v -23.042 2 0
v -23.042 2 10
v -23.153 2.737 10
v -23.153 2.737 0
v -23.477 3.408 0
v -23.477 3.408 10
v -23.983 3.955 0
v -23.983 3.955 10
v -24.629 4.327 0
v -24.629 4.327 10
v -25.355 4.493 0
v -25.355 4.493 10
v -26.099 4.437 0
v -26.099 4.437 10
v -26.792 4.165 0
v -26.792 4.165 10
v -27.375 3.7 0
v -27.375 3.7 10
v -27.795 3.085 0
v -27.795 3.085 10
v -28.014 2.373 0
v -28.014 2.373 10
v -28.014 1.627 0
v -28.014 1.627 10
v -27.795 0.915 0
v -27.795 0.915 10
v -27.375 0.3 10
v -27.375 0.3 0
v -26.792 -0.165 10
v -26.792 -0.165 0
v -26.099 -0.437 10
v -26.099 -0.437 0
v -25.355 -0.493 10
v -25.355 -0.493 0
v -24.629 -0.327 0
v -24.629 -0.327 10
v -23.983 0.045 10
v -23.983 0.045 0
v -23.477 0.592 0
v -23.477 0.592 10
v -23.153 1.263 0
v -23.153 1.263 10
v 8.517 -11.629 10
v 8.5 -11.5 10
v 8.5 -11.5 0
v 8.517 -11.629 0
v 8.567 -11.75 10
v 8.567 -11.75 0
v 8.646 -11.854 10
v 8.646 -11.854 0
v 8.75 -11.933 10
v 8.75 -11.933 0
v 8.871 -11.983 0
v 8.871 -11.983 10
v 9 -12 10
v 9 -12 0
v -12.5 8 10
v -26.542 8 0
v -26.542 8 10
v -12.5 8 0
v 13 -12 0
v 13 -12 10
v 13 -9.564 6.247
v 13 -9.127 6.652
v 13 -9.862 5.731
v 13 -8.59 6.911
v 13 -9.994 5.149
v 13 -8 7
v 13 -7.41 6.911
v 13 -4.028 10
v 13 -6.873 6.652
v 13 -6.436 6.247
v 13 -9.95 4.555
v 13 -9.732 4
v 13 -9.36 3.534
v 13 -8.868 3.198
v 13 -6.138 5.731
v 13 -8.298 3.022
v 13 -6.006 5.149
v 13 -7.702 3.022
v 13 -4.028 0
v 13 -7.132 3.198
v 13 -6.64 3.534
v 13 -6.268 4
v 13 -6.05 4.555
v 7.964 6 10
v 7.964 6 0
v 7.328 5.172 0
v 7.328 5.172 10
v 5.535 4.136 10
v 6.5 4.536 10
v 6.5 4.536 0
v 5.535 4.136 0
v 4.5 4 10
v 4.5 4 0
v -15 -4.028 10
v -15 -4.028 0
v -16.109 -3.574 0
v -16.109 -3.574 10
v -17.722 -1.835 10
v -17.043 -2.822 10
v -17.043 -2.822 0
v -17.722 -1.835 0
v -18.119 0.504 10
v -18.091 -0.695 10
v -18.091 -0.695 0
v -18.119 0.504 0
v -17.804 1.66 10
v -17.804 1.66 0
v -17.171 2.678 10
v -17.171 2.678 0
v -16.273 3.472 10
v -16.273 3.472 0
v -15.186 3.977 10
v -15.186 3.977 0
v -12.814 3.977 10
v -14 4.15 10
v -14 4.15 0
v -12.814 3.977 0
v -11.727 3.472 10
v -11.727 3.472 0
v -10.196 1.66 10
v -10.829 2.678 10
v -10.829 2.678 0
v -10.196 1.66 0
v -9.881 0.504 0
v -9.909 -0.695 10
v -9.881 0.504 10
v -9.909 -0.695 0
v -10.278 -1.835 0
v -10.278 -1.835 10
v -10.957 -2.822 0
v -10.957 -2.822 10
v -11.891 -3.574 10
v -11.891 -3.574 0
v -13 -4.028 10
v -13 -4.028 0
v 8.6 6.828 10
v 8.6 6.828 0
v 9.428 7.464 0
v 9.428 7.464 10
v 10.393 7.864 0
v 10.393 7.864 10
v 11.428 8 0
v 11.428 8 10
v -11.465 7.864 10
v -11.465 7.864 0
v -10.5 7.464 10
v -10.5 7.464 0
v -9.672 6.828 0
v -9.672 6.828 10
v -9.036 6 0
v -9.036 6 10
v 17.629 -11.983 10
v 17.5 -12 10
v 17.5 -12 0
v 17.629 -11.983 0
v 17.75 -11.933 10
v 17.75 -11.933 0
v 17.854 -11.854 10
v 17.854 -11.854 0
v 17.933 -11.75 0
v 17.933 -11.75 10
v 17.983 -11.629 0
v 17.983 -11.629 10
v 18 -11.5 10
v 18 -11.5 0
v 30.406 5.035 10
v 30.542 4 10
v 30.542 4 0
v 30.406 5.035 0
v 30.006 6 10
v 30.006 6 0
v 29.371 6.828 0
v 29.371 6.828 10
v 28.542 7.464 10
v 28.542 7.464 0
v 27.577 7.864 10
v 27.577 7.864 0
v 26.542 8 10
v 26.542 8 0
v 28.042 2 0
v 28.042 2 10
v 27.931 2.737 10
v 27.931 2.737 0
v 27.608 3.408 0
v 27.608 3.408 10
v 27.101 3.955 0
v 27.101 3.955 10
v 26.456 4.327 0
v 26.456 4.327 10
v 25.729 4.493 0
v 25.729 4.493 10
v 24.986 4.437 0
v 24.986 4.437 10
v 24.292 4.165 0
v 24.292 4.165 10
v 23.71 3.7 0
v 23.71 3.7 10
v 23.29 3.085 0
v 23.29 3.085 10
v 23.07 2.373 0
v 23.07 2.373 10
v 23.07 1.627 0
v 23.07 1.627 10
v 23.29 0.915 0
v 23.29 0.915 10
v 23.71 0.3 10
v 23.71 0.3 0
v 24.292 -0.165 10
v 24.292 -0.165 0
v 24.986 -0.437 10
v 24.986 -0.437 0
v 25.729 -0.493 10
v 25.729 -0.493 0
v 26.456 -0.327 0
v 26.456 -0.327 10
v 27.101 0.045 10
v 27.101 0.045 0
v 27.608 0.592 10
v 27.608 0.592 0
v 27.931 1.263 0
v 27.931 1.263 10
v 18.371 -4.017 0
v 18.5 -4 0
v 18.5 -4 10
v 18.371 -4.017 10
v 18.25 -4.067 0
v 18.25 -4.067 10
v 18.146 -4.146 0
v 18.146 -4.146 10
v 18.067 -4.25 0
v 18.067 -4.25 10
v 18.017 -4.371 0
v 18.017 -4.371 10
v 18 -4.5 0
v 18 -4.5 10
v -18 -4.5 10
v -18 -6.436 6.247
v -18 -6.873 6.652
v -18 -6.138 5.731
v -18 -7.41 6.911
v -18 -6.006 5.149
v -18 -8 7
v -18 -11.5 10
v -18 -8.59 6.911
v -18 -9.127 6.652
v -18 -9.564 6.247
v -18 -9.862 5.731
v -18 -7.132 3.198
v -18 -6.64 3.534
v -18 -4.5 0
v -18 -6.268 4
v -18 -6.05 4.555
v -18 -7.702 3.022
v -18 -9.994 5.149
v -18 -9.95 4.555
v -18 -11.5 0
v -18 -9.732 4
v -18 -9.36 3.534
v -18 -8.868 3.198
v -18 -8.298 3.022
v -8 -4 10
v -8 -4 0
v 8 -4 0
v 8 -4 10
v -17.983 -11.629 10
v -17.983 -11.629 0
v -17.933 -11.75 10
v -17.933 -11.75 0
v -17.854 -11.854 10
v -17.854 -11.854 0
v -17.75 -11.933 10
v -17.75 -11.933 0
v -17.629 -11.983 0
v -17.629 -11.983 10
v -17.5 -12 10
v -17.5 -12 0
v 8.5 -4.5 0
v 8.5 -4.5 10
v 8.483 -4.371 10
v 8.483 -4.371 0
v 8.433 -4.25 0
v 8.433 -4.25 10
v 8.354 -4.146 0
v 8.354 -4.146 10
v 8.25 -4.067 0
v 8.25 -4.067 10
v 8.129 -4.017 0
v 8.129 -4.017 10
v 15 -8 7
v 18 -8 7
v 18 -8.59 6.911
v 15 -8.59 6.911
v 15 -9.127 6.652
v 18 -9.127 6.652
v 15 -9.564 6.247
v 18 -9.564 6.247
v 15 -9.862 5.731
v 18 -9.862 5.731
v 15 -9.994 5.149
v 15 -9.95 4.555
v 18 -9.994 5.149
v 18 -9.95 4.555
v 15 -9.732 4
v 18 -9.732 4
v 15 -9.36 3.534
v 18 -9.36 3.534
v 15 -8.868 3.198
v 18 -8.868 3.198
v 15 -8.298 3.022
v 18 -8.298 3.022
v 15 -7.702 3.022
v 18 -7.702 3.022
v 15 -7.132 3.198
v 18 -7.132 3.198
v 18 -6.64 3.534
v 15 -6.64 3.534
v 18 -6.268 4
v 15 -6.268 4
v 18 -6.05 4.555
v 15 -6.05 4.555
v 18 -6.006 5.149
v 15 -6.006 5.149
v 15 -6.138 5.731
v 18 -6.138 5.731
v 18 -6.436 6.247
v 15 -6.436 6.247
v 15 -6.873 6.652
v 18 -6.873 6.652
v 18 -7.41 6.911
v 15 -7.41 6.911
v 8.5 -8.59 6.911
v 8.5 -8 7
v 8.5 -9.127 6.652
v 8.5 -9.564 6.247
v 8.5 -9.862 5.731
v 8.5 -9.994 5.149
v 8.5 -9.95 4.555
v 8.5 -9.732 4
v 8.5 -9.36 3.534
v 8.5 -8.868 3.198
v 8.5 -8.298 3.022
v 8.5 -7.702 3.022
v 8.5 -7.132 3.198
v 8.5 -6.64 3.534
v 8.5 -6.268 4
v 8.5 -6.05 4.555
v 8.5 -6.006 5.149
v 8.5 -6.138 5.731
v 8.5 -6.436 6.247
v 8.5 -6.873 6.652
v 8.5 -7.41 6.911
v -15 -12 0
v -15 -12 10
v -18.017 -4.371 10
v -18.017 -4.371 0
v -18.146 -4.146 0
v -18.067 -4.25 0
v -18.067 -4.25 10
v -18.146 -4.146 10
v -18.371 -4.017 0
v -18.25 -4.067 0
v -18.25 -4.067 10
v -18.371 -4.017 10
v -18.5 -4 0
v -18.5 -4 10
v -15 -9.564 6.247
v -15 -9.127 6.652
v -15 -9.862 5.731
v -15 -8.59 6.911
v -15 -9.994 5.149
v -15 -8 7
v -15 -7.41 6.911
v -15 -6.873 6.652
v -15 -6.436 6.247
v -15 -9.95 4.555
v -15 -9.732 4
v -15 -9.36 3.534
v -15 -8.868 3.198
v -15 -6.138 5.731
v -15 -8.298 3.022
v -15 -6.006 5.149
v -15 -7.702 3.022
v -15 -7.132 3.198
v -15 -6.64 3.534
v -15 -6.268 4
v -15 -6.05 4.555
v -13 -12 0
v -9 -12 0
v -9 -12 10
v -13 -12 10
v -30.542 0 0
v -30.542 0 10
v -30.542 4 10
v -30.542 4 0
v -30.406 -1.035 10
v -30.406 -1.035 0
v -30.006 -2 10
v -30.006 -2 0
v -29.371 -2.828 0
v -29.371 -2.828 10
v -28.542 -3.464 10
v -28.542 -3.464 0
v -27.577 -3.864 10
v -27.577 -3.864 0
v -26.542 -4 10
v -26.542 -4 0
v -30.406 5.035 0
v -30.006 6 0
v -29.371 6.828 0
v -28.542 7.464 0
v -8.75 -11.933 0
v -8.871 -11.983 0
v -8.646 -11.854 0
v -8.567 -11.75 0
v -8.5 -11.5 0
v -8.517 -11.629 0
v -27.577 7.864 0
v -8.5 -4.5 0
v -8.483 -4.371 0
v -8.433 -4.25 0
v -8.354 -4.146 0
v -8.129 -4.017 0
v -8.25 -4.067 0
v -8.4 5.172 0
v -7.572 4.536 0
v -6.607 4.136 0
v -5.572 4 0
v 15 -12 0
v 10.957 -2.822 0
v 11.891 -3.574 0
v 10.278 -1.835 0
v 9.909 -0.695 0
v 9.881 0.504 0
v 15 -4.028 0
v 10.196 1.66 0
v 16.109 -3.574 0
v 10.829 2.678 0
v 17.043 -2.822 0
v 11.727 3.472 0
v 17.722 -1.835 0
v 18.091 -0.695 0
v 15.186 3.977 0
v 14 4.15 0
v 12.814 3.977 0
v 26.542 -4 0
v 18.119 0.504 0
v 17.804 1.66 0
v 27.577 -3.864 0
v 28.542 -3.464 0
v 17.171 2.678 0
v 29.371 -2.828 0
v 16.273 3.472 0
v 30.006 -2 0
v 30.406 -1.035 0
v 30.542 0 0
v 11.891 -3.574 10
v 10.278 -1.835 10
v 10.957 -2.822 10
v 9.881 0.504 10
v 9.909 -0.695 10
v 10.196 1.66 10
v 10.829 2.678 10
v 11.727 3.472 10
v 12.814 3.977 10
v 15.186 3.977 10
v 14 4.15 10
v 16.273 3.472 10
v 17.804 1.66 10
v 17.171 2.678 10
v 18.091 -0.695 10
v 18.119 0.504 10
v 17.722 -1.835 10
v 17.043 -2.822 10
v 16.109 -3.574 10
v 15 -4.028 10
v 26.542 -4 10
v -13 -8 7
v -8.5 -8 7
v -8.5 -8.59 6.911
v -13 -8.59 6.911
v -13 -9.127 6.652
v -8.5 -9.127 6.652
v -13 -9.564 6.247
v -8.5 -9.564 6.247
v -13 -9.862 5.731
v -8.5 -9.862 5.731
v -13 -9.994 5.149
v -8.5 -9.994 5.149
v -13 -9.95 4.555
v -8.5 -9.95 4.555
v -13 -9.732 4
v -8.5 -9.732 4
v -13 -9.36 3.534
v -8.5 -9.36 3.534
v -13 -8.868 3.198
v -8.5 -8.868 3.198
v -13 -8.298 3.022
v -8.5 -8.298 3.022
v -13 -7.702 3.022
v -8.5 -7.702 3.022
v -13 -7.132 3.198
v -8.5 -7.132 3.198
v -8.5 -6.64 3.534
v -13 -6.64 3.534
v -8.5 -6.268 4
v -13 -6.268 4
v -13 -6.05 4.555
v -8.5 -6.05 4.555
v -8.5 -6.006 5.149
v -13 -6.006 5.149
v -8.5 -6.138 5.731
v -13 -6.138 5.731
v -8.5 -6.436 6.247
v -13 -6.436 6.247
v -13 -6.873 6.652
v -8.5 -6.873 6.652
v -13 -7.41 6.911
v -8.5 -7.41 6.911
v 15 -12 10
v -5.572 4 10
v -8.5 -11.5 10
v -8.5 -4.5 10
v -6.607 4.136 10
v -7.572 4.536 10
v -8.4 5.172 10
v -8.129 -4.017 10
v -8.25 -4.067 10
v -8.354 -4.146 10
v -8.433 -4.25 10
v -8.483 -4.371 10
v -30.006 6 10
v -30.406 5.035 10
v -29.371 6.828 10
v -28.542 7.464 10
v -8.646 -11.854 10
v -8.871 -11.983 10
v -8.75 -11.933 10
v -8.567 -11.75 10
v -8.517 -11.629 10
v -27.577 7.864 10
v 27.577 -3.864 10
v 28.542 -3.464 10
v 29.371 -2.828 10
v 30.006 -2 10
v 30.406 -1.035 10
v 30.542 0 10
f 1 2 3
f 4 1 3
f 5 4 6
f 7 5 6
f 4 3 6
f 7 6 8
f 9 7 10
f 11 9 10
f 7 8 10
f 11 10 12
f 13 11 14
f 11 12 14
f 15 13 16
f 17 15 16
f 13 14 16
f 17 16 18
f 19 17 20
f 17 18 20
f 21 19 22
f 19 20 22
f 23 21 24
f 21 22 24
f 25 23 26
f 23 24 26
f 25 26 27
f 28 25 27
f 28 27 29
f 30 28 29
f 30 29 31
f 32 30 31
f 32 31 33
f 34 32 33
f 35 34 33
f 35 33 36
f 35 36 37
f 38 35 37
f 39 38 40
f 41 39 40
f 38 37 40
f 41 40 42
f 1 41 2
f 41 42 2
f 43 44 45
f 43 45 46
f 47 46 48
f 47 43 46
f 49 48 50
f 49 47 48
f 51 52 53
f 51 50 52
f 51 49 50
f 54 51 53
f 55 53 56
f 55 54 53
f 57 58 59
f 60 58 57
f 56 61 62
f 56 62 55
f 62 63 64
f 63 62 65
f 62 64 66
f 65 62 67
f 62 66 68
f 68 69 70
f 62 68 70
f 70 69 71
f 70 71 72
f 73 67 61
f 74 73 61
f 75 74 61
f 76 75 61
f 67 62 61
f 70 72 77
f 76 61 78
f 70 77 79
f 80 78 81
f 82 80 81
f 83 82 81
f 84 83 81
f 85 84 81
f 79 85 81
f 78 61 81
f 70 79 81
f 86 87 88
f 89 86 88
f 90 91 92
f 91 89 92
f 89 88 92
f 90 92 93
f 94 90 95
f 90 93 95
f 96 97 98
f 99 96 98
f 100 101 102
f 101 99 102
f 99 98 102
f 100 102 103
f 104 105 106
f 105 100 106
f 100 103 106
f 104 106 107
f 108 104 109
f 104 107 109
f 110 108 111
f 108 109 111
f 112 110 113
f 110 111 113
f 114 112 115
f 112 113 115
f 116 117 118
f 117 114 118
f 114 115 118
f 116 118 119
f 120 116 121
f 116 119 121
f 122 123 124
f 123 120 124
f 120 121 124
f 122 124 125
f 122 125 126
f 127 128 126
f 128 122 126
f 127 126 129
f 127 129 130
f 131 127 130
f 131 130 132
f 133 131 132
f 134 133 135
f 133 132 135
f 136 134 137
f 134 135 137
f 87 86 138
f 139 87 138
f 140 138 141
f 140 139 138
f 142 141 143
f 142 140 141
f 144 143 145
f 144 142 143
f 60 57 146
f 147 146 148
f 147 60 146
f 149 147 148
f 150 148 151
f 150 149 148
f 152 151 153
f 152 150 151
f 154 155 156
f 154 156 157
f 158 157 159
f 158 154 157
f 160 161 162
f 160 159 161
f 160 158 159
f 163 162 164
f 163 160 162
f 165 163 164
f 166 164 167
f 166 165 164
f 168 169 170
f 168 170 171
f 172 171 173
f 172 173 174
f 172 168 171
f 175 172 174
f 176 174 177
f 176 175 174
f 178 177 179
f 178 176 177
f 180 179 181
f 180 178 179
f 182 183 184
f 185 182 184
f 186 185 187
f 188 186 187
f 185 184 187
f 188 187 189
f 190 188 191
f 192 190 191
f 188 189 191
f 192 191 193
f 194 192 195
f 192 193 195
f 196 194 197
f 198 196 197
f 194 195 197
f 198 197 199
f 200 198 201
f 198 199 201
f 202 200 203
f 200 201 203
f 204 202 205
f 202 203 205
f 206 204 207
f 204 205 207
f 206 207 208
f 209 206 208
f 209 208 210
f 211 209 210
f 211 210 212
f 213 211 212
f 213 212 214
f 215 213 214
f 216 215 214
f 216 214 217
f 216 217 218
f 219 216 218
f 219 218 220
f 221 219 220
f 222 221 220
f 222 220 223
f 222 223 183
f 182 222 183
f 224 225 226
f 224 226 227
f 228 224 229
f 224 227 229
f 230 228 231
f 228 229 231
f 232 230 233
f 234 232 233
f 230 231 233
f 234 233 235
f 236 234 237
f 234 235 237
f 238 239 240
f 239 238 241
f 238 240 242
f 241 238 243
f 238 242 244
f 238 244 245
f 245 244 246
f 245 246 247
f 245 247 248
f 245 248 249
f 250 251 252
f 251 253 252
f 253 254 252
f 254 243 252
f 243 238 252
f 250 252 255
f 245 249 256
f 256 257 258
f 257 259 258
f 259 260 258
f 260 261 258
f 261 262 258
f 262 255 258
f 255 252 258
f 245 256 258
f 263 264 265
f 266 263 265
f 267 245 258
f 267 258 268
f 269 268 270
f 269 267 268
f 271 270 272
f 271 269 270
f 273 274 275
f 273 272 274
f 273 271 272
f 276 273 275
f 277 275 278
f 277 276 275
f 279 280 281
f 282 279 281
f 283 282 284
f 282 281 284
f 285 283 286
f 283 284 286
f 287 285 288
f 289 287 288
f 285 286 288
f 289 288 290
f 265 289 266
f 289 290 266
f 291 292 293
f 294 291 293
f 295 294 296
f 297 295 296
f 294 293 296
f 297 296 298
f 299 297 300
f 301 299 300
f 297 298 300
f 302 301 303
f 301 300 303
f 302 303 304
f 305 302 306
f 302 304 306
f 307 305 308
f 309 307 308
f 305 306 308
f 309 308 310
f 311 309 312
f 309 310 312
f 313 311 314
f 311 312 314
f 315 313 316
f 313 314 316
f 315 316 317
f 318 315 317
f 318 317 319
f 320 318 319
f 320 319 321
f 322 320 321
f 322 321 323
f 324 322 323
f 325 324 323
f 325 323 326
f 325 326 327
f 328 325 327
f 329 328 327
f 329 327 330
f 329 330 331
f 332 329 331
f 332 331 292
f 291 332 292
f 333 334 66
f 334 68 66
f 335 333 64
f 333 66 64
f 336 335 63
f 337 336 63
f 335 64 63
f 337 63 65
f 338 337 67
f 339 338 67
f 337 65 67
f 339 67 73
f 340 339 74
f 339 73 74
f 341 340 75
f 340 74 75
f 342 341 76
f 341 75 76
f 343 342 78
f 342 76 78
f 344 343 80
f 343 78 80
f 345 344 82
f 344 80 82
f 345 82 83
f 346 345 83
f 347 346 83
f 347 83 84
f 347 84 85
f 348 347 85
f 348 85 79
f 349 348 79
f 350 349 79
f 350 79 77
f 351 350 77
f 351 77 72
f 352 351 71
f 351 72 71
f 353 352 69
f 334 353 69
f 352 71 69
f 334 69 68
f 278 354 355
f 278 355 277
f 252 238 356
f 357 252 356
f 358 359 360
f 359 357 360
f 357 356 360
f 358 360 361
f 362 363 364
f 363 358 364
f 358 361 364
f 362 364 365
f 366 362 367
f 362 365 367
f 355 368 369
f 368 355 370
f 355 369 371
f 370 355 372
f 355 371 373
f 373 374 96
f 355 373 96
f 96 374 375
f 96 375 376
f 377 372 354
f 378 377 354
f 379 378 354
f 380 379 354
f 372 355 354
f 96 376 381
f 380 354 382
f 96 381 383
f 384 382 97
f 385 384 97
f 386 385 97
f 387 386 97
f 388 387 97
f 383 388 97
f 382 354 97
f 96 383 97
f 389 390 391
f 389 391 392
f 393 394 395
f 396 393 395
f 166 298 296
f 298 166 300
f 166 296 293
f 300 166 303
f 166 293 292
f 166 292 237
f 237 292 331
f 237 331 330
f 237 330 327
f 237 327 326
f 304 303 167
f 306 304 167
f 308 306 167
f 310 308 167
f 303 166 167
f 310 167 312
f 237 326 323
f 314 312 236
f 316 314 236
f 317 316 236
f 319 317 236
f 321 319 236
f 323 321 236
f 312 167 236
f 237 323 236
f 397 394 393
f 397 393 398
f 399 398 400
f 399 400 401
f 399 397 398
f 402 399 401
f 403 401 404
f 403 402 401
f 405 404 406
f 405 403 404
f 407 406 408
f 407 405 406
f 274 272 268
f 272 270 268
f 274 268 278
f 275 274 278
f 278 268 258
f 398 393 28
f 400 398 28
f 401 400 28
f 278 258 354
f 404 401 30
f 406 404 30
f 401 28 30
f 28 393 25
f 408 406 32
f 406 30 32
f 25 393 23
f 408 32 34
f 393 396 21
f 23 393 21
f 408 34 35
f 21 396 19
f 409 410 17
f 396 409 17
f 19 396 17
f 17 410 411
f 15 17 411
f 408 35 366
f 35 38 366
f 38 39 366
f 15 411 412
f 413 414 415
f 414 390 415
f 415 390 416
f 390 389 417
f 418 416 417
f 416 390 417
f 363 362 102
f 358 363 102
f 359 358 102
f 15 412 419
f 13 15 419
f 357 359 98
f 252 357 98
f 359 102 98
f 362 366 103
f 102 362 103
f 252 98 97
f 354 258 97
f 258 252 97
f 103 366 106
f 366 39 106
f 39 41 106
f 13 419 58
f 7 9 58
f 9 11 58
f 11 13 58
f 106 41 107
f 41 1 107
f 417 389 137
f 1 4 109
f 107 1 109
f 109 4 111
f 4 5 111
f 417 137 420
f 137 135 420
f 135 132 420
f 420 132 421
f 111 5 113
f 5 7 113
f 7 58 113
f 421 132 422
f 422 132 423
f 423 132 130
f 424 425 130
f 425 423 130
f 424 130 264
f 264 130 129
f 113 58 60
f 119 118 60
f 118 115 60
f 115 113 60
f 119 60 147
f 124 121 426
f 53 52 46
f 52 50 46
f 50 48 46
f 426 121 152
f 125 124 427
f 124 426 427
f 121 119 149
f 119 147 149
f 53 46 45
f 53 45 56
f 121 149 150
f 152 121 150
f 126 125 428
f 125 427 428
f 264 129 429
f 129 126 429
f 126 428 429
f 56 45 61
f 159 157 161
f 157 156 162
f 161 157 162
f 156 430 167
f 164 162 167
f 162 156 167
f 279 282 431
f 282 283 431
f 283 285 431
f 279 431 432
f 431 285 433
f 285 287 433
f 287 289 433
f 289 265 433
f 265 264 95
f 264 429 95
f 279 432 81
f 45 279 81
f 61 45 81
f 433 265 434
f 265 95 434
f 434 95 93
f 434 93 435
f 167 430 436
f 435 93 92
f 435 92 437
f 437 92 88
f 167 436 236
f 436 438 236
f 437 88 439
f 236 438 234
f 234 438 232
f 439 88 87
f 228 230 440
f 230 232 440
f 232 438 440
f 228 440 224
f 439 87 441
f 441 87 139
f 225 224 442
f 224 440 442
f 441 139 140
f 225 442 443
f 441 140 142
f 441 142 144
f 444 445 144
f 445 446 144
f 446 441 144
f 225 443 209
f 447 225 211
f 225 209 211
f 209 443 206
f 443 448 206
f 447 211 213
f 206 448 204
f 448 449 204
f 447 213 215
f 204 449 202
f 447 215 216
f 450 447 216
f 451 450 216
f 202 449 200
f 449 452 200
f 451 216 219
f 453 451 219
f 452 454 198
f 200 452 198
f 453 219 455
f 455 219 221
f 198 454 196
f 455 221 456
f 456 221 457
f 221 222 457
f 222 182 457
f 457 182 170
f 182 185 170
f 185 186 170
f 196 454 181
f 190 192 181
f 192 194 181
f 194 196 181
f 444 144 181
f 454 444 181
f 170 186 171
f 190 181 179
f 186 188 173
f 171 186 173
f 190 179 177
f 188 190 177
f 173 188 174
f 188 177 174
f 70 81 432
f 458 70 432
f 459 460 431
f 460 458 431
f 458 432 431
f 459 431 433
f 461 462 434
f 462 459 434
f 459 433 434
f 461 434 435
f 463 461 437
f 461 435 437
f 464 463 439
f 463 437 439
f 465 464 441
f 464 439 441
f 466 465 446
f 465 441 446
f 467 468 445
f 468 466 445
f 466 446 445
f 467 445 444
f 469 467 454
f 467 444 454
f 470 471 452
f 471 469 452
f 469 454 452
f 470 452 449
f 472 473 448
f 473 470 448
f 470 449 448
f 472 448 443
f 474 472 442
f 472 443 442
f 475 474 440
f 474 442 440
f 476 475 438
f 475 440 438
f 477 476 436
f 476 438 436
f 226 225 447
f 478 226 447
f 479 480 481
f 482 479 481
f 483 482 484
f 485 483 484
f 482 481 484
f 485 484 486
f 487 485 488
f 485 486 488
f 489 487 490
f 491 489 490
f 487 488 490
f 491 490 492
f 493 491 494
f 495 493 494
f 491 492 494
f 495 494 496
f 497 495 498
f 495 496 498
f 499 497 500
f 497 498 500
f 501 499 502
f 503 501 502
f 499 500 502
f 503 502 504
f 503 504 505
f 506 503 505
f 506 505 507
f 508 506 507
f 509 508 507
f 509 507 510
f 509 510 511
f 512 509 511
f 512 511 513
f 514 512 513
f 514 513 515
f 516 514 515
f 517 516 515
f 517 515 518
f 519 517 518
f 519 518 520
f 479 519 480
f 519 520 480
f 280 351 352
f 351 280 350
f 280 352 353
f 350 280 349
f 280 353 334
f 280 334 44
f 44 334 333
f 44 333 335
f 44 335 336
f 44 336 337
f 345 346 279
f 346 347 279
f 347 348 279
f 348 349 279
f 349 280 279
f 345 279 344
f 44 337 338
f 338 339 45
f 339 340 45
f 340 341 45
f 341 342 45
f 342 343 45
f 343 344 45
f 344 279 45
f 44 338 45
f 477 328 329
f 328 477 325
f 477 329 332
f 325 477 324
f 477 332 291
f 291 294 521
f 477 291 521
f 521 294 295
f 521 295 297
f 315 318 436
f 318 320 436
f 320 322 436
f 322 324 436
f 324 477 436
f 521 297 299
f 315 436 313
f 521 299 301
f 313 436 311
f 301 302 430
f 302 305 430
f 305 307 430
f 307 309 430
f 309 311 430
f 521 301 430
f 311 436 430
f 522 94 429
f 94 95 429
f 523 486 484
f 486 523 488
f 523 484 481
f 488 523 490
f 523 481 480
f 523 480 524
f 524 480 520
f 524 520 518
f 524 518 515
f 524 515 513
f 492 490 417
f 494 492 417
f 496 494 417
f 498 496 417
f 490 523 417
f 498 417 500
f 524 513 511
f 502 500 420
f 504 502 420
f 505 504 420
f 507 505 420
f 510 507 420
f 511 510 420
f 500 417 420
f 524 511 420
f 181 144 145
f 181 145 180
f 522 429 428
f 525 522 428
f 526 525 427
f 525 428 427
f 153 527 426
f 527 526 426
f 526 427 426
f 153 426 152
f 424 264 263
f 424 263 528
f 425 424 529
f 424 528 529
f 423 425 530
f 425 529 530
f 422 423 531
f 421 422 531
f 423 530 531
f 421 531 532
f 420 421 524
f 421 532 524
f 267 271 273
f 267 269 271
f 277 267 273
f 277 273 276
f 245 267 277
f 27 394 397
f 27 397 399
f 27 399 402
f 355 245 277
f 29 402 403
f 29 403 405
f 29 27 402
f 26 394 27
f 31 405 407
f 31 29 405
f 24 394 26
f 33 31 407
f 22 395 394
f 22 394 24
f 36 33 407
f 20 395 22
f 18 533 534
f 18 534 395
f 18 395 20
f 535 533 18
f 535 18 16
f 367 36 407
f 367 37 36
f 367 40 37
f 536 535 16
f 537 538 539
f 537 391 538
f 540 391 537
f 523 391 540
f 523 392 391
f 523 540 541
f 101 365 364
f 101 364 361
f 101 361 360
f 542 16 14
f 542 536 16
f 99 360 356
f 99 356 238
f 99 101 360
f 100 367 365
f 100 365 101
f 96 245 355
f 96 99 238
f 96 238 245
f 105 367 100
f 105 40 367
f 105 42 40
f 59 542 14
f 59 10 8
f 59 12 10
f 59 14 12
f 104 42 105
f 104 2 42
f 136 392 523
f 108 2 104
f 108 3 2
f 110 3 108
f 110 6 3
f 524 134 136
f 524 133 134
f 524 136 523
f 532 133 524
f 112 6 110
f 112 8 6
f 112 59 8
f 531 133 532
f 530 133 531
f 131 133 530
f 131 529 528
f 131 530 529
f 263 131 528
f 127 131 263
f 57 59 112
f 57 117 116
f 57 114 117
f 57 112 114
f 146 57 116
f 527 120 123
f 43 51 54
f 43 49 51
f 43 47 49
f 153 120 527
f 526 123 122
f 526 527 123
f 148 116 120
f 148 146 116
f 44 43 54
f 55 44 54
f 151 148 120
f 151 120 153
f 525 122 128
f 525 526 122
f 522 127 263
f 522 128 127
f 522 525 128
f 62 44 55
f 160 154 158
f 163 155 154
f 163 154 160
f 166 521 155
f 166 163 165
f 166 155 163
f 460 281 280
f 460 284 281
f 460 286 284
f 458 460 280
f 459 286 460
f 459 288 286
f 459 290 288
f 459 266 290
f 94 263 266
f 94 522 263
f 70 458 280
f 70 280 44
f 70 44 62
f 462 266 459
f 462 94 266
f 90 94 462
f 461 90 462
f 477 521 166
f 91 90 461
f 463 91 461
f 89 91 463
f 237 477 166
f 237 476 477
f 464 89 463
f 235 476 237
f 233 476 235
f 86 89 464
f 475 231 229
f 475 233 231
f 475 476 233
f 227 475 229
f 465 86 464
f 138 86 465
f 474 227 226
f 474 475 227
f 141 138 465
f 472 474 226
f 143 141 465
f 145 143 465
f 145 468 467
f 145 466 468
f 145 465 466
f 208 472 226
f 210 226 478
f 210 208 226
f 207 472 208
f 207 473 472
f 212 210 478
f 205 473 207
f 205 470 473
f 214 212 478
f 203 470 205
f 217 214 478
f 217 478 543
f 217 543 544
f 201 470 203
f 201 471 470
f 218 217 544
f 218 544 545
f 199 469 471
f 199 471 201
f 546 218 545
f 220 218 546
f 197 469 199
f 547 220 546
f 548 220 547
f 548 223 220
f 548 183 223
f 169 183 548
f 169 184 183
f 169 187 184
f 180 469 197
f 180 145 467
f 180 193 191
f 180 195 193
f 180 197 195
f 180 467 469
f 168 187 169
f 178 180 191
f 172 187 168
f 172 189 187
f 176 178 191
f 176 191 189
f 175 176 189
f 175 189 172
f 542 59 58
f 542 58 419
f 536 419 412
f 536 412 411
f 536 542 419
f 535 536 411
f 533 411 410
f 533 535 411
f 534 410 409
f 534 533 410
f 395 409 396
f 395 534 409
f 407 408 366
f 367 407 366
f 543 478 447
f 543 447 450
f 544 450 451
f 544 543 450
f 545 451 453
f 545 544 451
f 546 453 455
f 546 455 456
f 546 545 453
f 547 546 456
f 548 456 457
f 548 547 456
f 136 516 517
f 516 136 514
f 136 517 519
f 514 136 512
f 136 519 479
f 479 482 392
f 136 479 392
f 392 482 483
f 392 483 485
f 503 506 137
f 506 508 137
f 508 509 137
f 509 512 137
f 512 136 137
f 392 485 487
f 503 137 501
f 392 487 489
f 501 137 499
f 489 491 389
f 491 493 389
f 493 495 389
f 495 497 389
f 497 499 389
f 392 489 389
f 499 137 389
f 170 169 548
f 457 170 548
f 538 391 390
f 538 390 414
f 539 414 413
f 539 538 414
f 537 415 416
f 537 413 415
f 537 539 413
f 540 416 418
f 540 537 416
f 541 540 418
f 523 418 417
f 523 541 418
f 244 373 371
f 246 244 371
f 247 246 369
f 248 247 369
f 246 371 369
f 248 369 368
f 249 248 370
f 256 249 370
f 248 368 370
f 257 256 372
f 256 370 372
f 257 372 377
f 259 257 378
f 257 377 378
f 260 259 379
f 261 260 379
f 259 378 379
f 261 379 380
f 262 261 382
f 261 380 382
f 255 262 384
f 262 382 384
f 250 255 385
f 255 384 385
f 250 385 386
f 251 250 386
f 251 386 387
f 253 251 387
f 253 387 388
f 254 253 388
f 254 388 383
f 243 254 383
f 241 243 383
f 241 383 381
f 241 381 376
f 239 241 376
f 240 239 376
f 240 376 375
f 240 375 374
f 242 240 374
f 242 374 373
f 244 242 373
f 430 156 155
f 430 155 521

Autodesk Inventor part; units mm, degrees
ref_plane "YZ Plane" through (0, 0, 0) normal (1, 0, 0) x (0, 1, 0)
ref_plane "XZ Plane" through (0, 0, 0) normal (0, 1, 0) x (-1, 0, 0)
ref_plane "XY Plane" through (0, 0, 0) normal (0, 0, 1) x (1, 0, 0)
sketch "Sketch1" plane through (0, 0, 0) normal (0, 0, 1) x (1, 0, 0)
  line L0 (-20.5422, 8) -> (20.5422, 8)
  line L1 (20.5422, 8) -> (20.5422, -12)
  line L2 (20.5422, -12) -> (-20.5422, -12)
  line L3 (-20.5422, -12) -> (-20.5422, 8)
  arc A0 (-13, -4.0277) -> (-15, -4.0277) centre (-14, 0) ccw
  arc A1 (15, -4.0277) -> (13, -4.0277) centre (14, 0) ccw
  line L4 (0, 8) -> (0, -12) construction
  line L5 (-13, -4.0277) -> (-13, -12)
  line L6 (-13, -12) -> (-15, -12)
  line L7 (-15, -12) -> (-15, -4.0277)
  line L8 (15, -4.0277) -> (15, -12)
  line L9 (15, -12) -> (13, -12)
  line L10 (13, -12) -> (13, -4.0277)
  line L11 (-20.5422, -4) -> (-18, -4)
  line L12 (-18, -4) -> (-18, -12)
  line L13 (-18, -12) -> (-20.5422, -12)
  line L14 (-20.5422, -12) -> (-20.5422, -4)
  line L15 (18, -4) -> (20.5422, -4)
  line L16 (20.5422, -4) -> (20.5422, -12)
  line L17 (20.5422, -12) -> (18, -12)
  line L18 (18, -12) -> (18, -4)
  line L19 (-8.5, -4) -> (8.5, -4)
  line L20 (8.5, -4) -> (8.5, -12)
  line L21 (8.5, -12) -> (-8.5, -12)
  line L22 (-8.5, -12) -> (-8.5, -4)
  line L23 (-8.5, 8) -> (8.5, 8)
  line L24 (8.5, 8) -> (8.5, 4)
  line L25 (8.5, 4) -> (-8.5, 4)
  line L26 (-8.5, 4) -> (-8.5, 8)
  point P0 (0, 0)
  point P1 (0, -2)
  point P2 (-14, -4.3116)
  point P3 (14, -4.0277)
  point P4 (0, -4)
  point P5 (-13, -12)
  point P6 (-8.5, -12)
  point P7 (8.5, -12)
  point P8 (20.5422, -4)
  point P9 (8.5, 8)
  point P10 (-8.5, 8)
  point P11 (-15, -12)
  dimension "d0" = 8.3
  dimension "d1" = 28
  dimension "d2" = 2
  dimension "d4" = 2
  dimension "d6" = 41.0844
  dimension "d7" = 8
  dimension "d8" = 12
  dimension "d9" = 20
  dimension "d10" = 3
  dimension "d11" = 3
  dimension "d13" = 8
  dimension "d15" = 5.5
  dimension "d16" = 5.5
  dimension "d17" = 4
  dimension "d18" = 4
extrude "Extrusion1" add sketch "Sketch1" along normal blind 10 contours L0 L26 L25 L24 L1 L15 L18 L2 L8 A1 L10 L20 L19 L22 L5 A0 L7 L12 L11 L3
sketch "Sketch2" plane through (-18, -12, 0) normal (-1, 0, 0) x (0, 0, 1)
  circle A0 centre (5, 4) radius 1.75
  line L0 (0, 0) -> (10, 0) projected
  line L1 (10, 8) -> (10, 0) projected
  circle A1 centre (5, 4) radius 3 construction
  point P0 (0, 12)
  point P1 (5, 0)
  point P2 (10, 4)
  dimension "d22" = 3.5
  dimension "d23" = 6
hole "Hole1" at (-18, -8, 5) direction (1, 0, 0) diameter 4 end through all
fillet "Fillet2" radius 0.5 8 edges at (-18, -4, 5) (-8.5, -4, 5) (8.5, -4, 5) (18, -4, 5) (-18, -12, 5) (-8.5, -12, 5) (8.5, -12, 5) (18, -12, 5)
sketch "Sketch4" plane through (0, 0, 10) normal (0, 0, 1) x (1, 0, 0)
  line L0 (-30.5422, 8) -> (-20.5422, 8)
  line L1 (-20.5422, 8) -> (-20.5422, -4)
  line L2 (-20.5422, -4) -> (-30.5422, -4)
  line L3 (-30.5422, -4) -> (-30.5422, 8)
  line L4 (20.5422, 8) -> (30.5422, 8)
  line L5 (30.5422, 8) -> (30.5422, -4)
  line L6 (30.5422, -4) -> (20.5422, -4)
  line L7 (20.5422, -4) -> (20.5422, 8)
  line L8 (20.5422, -4) -> (20.5422, 8) projected
  line L9 (18.5, -4) -> (20.5422, -4) projected
  line L10 (20.5422, 8) -> (8.5, 8) projected
  line L11 (-8.5, 8) -> (-20.5422, 8) projected
  line L12 (-20.5422, -4) -> (-18.5, -4) projected
  line L13 (-20.5422, 8) -> (-20.5422, -4) projected
  circle A0 centre (-25.5422, 2) radius 2.5
  circle A1 centre (25.5422, 2) radius 2.5
  point P0 (0, 0)
  point P1 (25.5422, 8)
  point P2 (30.5422, 2)
  point P3 (-30.5422, 2)
  point P4 (-25.5422, 8)
  dimension "d32" = 10
  dimension "d33" = 5
  dimension "d34" = 0
  dimension "d35" = 0
  dimension "d36" = 0
  dimension "d37" = 0
extrude "Extrusion2" add sketch "Sketch4" against normal up to surface (10 mm away)
fillet "Fillet3" radius 4 8 edges at (8.5, 8, 5) (30.5422, 8, 5) (30.5422, -4, 5) (8.5, 4, 5) (-8.5, 4, 5) (-8.5, 8, 5) (-30.5422, 8, 5) (-30.5422, -4, 5)
equation "\"d4\" = d2"
equation "\"d11\" = d10"
equation "\"d13\" = d7"
properties part number "0008-30-006"
